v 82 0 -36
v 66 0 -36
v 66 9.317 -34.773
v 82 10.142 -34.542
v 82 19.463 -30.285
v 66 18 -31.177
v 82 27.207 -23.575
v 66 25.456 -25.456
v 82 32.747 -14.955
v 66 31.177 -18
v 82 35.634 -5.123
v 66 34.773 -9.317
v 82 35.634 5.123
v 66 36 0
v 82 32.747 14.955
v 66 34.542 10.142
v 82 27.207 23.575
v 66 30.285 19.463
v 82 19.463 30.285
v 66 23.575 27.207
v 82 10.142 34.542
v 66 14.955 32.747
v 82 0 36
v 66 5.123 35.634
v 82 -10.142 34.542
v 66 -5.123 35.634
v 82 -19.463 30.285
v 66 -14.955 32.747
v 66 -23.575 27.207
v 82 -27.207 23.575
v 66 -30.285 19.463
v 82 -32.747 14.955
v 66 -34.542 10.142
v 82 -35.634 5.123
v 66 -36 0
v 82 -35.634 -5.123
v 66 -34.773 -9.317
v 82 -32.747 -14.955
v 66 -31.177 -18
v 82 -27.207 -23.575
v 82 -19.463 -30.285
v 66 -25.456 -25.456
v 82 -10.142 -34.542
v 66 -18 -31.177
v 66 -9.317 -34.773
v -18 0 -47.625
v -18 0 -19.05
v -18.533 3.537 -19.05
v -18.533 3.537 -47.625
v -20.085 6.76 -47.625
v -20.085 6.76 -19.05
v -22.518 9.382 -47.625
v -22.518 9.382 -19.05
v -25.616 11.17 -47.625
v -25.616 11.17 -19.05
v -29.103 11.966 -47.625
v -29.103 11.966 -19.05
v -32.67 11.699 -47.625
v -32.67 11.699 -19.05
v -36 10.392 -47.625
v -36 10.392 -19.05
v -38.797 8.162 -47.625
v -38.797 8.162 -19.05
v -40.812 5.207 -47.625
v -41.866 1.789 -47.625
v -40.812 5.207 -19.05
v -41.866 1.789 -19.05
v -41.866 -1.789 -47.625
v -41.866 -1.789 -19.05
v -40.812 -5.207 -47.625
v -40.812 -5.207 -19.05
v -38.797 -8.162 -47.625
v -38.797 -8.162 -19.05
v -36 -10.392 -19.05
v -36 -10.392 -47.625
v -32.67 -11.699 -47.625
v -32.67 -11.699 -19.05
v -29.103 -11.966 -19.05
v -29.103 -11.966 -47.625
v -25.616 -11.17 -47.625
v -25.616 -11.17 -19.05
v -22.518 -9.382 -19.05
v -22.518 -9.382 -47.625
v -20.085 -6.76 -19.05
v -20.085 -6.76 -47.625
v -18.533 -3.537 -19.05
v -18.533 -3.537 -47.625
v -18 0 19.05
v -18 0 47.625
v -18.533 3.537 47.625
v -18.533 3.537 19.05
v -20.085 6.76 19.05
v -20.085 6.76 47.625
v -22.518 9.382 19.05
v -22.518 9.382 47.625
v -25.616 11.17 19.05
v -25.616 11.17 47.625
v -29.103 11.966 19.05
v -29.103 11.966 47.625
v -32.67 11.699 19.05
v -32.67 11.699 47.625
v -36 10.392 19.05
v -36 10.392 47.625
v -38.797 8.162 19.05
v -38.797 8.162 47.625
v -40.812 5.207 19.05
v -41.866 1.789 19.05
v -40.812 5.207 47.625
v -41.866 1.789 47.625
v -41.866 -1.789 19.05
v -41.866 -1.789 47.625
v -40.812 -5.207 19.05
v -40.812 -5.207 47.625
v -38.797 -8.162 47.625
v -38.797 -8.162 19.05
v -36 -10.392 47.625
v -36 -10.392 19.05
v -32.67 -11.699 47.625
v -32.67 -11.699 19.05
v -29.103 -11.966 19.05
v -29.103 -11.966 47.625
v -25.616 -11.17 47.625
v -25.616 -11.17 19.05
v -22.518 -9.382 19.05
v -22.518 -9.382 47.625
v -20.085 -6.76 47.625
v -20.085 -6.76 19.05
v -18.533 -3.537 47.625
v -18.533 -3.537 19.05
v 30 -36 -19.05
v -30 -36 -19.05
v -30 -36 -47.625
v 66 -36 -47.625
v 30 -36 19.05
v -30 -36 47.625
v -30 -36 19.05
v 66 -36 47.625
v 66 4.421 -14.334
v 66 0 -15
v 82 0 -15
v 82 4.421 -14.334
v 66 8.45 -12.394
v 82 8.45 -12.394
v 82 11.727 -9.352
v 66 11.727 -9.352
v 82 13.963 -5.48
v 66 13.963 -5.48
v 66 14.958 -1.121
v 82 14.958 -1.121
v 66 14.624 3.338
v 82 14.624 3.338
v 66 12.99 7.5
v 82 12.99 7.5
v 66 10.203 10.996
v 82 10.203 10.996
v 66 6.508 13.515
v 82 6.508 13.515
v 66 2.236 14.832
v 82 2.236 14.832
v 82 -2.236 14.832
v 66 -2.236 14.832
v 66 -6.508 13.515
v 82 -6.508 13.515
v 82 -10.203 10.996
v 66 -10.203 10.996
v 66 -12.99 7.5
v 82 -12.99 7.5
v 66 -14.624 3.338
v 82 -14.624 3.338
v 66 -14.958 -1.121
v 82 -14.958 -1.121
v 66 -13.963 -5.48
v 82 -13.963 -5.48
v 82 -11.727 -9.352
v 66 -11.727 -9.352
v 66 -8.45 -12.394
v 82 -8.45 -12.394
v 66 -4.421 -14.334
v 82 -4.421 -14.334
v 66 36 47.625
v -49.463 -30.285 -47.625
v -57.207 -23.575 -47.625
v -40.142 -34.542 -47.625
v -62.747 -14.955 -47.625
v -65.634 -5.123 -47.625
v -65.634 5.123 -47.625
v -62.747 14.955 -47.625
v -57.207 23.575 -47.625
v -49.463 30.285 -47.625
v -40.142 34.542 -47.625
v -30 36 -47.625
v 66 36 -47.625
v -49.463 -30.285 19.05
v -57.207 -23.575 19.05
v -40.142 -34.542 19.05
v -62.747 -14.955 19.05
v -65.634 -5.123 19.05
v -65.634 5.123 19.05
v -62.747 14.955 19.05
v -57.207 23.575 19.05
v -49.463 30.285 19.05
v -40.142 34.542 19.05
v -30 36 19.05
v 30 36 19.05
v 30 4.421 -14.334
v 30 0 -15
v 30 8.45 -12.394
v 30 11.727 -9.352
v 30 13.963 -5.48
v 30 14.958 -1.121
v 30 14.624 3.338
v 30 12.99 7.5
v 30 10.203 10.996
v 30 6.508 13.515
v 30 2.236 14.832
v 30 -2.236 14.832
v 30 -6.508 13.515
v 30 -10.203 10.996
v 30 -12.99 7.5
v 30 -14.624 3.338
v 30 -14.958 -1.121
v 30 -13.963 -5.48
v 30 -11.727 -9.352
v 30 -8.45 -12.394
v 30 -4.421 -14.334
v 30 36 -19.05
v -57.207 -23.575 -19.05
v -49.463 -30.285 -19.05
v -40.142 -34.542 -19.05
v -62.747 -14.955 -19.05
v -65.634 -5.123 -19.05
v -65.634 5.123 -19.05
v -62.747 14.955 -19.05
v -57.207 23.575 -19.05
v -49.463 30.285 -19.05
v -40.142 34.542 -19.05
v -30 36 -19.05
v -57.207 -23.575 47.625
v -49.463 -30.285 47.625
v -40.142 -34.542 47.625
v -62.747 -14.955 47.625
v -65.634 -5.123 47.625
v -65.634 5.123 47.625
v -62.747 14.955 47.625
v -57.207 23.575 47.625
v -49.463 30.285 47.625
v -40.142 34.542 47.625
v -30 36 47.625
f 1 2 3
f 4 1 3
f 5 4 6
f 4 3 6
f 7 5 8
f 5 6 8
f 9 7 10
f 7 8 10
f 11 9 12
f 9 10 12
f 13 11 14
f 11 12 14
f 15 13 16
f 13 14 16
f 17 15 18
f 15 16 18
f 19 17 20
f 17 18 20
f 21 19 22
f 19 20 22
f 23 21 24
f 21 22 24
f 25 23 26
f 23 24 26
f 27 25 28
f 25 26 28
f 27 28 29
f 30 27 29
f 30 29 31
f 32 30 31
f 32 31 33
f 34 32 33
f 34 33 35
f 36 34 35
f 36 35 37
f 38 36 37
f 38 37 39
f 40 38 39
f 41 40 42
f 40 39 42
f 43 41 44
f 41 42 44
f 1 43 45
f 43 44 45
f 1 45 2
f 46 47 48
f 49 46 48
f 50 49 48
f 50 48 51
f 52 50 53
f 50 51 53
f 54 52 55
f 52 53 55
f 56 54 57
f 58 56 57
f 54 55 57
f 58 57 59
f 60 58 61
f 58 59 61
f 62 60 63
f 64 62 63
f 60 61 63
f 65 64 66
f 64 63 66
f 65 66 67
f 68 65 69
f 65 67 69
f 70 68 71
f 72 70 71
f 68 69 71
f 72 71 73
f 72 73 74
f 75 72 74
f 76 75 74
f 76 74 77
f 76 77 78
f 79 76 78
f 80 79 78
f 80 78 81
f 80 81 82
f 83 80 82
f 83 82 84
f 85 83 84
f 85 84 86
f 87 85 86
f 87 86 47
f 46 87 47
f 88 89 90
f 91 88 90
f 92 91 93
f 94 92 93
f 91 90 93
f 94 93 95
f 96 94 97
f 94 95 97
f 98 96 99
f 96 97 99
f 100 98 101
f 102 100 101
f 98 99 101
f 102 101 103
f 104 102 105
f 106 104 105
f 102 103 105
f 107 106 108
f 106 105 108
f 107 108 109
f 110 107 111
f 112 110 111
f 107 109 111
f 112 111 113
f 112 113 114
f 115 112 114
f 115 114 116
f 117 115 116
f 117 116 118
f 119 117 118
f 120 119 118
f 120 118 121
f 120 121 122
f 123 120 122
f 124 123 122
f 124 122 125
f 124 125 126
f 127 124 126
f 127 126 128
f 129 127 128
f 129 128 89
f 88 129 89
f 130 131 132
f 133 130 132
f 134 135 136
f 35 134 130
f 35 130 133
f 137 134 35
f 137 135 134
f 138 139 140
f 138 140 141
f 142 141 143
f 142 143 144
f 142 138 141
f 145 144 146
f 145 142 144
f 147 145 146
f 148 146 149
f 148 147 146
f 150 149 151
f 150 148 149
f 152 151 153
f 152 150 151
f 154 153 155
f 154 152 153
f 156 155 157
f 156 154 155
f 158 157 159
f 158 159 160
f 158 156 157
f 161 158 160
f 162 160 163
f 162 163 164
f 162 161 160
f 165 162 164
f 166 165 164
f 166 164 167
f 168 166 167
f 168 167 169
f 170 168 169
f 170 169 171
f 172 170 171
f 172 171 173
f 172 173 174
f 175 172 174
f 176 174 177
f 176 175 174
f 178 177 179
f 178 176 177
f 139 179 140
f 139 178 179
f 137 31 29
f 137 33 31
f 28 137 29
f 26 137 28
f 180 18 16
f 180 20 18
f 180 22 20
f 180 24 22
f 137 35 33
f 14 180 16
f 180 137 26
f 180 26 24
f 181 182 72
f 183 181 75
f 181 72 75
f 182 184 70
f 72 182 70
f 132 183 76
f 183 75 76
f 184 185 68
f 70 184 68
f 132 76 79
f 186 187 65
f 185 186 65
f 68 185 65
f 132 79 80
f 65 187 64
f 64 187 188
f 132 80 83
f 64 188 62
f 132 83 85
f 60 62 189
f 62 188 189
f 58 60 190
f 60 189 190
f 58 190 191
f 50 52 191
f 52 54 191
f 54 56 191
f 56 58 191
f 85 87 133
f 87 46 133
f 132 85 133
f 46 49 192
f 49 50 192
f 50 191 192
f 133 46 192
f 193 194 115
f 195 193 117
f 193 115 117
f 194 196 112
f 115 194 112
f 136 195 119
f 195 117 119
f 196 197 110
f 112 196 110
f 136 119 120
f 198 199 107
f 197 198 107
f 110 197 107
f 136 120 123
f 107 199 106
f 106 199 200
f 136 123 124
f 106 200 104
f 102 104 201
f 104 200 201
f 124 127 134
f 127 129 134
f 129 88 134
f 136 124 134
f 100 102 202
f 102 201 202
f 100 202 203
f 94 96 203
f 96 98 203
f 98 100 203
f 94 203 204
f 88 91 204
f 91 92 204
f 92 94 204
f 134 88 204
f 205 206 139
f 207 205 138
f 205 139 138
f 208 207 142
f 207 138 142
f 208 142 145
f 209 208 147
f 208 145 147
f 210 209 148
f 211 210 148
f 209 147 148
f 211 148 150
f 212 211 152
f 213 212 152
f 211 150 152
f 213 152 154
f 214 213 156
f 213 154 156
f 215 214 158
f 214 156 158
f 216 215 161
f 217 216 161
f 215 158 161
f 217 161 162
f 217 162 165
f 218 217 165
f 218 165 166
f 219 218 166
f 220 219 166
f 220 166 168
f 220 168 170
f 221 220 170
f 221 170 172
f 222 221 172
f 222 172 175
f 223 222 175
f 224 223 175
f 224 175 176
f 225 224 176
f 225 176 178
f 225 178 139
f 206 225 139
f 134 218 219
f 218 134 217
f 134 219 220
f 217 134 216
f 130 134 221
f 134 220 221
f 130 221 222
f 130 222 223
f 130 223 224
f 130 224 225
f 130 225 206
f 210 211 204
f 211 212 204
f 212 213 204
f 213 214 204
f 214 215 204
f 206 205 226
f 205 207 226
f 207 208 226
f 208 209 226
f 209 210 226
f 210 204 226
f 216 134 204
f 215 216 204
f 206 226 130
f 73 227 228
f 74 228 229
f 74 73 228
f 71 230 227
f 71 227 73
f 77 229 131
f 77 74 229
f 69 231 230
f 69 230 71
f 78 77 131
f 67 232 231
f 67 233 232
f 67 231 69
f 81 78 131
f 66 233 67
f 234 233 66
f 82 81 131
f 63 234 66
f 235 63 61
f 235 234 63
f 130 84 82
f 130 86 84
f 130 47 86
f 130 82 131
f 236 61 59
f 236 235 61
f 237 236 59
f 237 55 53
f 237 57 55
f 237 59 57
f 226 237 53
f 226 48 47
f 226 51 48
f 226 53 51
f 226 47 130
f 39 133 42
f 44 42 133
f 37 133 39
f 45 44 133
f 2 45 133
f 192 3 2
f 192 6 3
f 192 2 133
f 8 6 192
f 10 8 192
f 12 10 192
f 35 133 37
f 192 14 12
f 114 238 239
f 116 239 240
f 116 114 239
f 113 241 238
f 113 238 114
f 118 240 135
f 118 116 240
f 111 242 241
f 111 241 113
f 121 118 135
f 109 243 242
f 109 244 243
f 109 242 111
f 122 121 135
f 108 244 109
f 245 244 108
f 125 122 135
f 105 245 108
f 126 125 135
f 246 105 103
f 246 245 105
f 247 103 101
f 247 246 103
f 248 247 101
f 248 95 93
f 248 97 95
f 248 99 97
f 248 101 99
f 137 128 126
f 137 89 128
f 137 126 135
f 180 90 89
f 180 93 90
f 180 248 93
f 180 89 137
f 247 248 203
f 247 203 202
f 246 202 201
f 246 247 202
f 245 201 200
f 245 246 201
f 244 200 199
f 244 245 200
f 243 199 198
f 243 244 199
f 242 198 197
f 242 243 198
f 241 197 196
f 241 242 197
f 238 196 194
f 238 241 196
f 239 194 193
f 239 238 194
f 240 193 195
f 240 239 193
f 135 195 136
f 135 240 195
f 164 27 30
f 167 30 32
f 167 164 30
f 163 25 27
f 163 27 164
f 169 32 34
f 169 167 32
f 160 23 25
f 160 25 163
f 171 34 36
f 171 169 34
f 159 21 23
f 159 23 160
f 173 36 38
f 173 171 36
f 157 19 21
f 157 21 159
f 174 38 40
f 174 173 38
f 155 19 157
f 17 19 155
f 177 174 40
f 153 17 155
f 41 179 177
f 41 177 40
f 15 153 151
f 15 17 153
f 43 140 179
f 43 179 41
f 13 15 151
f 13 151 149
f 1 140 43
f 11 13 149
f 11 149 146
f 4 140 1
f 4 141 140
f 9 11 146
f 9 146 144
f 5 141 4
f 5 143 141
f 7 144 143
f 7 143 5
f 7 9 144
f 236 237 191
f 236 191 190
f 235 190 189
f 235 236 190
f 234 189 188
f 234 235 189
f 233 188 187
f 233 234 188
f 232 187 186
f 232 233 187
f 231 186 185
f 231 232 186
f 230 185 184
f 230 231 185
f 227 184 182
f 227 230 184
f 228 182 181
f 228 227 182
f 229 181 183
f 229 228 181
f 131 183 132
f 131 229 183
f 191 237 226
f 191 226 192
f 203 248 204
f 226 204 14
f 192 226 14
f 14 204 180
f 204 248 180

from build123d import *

# Parameters (mm, degrees)
SKETCH1_W               = 132
SKETCH1_H               = 72
BOSS_EXTRUDE1_DEPTH     = 47.625
CUT_EXTRUDE1_DEPTH      = 1
CUT_EXTRUDE1_DEPTH_BACK = 96.25
SKETCH3_W               = 96
SKETCH3_H               = 38.1
CUT_EXTRUDE2_DEPTH      = 73
SKETCH4_R               = 15
CUT_EXTRUDE3_DEPTH      = 133
SKETCH5_R               = 36
SKETCH5_R_2             = 15
BOSS_EXTRUDE2_DEPTH     = 16
SKETCH6_R               = 12
CUT_EXTRUDE4_DEPTH      = 96.25


with BuildPart() as part:
    # Sketch1 → Boss-Extrude1 (new body, symmetric)
    with BuildSketch(Plane.XY):
        Rectangle(SKETCH1_W, SKETCH1_H)
    extrude(amount=BOSS_EXTRUDE1_DEPTH, both=True)

    # Sketch2 → Cut-Extrude1 (cut, two sides)
    with BuildSketch(Plane.XY.offset(47.625)) as cut_extrude1_sk:
        with BuildLine():
            Line((220.000004886, 36), (-30, 36))
            ThreePointArc((-30, 36), (-66, 1.527e-06), (-30.000003054, -36))
            Line((-30.000003054, -36), (220.000001832, -36.000021206))
            Line((220.000001832, -36.000021206), (-280.000007939, -36))
            Line((-280.000007939, -36), (-280.000004886, 36.000021206))
            Line((-280.000004886, 36.000021206), (220.000004886, 36))
        make_face()
    extrude(amount=CUT_EXTRUDE1_DEPTH, mode=Mode.SUBTRACT)
    extrude(cut_extrude1_sk.sketch, amount=-CUT_EXTRUDE1_DEPTH_BACK, mode=Mode.SUBTRACT)

    # Sketch3 → Cut-Extrude2 (cut, through all)
    with BuildSketch(Plane(origin=(0, 36, 0), x_dir=(1, 0, 0), z_dir=(0, 1, 0))):
        with Locations((-18, 0)):
            Rectangle(SKETCH3_W, SKETCH3_H)
    extrude(amount=-CUT_EXTRUDE2_DEPTH, mode=Mode.SUBTRACT)

    # Sketch4 → Cut-Extrude3 (cut, through all)
    with BuildSketch(Plane(origin=(66, 0, 0), x_dir=(0, 0, -1), z_dir=(1, 0, 0))):
        Circle(SKETCH4_R)
    extrude(amount=-CUT_EXTRUDE3_DEPTH, mode=Mode.SUBTRACT)

    # Sketch5 → Boss-Extrude2 (add)
    with BuildSketch(Plane(origin=(66, 0, 0), x_dir=(0, 0, -1), z_dir=(1, 0, 0))):
        Circle(SKETCH5_R)
        Circle(SKETCH5_R_2, mode=Mode.SUBTRACT)
    extrude(amount=BOSS_EXTRUDE2_DEPTH)

    # Sketch6 → Cut-Extrude4 (cut, through all)
    with BuildSketch(Plane.XY.offset(47.625)):
        with Locations((-30, 0)):
            Circle(SKETCH6_R)
    extrude(amount=-CUT_EXTRUDE4_DEPTH, mode=Mode.SUBTRACT)


solid = part.part
